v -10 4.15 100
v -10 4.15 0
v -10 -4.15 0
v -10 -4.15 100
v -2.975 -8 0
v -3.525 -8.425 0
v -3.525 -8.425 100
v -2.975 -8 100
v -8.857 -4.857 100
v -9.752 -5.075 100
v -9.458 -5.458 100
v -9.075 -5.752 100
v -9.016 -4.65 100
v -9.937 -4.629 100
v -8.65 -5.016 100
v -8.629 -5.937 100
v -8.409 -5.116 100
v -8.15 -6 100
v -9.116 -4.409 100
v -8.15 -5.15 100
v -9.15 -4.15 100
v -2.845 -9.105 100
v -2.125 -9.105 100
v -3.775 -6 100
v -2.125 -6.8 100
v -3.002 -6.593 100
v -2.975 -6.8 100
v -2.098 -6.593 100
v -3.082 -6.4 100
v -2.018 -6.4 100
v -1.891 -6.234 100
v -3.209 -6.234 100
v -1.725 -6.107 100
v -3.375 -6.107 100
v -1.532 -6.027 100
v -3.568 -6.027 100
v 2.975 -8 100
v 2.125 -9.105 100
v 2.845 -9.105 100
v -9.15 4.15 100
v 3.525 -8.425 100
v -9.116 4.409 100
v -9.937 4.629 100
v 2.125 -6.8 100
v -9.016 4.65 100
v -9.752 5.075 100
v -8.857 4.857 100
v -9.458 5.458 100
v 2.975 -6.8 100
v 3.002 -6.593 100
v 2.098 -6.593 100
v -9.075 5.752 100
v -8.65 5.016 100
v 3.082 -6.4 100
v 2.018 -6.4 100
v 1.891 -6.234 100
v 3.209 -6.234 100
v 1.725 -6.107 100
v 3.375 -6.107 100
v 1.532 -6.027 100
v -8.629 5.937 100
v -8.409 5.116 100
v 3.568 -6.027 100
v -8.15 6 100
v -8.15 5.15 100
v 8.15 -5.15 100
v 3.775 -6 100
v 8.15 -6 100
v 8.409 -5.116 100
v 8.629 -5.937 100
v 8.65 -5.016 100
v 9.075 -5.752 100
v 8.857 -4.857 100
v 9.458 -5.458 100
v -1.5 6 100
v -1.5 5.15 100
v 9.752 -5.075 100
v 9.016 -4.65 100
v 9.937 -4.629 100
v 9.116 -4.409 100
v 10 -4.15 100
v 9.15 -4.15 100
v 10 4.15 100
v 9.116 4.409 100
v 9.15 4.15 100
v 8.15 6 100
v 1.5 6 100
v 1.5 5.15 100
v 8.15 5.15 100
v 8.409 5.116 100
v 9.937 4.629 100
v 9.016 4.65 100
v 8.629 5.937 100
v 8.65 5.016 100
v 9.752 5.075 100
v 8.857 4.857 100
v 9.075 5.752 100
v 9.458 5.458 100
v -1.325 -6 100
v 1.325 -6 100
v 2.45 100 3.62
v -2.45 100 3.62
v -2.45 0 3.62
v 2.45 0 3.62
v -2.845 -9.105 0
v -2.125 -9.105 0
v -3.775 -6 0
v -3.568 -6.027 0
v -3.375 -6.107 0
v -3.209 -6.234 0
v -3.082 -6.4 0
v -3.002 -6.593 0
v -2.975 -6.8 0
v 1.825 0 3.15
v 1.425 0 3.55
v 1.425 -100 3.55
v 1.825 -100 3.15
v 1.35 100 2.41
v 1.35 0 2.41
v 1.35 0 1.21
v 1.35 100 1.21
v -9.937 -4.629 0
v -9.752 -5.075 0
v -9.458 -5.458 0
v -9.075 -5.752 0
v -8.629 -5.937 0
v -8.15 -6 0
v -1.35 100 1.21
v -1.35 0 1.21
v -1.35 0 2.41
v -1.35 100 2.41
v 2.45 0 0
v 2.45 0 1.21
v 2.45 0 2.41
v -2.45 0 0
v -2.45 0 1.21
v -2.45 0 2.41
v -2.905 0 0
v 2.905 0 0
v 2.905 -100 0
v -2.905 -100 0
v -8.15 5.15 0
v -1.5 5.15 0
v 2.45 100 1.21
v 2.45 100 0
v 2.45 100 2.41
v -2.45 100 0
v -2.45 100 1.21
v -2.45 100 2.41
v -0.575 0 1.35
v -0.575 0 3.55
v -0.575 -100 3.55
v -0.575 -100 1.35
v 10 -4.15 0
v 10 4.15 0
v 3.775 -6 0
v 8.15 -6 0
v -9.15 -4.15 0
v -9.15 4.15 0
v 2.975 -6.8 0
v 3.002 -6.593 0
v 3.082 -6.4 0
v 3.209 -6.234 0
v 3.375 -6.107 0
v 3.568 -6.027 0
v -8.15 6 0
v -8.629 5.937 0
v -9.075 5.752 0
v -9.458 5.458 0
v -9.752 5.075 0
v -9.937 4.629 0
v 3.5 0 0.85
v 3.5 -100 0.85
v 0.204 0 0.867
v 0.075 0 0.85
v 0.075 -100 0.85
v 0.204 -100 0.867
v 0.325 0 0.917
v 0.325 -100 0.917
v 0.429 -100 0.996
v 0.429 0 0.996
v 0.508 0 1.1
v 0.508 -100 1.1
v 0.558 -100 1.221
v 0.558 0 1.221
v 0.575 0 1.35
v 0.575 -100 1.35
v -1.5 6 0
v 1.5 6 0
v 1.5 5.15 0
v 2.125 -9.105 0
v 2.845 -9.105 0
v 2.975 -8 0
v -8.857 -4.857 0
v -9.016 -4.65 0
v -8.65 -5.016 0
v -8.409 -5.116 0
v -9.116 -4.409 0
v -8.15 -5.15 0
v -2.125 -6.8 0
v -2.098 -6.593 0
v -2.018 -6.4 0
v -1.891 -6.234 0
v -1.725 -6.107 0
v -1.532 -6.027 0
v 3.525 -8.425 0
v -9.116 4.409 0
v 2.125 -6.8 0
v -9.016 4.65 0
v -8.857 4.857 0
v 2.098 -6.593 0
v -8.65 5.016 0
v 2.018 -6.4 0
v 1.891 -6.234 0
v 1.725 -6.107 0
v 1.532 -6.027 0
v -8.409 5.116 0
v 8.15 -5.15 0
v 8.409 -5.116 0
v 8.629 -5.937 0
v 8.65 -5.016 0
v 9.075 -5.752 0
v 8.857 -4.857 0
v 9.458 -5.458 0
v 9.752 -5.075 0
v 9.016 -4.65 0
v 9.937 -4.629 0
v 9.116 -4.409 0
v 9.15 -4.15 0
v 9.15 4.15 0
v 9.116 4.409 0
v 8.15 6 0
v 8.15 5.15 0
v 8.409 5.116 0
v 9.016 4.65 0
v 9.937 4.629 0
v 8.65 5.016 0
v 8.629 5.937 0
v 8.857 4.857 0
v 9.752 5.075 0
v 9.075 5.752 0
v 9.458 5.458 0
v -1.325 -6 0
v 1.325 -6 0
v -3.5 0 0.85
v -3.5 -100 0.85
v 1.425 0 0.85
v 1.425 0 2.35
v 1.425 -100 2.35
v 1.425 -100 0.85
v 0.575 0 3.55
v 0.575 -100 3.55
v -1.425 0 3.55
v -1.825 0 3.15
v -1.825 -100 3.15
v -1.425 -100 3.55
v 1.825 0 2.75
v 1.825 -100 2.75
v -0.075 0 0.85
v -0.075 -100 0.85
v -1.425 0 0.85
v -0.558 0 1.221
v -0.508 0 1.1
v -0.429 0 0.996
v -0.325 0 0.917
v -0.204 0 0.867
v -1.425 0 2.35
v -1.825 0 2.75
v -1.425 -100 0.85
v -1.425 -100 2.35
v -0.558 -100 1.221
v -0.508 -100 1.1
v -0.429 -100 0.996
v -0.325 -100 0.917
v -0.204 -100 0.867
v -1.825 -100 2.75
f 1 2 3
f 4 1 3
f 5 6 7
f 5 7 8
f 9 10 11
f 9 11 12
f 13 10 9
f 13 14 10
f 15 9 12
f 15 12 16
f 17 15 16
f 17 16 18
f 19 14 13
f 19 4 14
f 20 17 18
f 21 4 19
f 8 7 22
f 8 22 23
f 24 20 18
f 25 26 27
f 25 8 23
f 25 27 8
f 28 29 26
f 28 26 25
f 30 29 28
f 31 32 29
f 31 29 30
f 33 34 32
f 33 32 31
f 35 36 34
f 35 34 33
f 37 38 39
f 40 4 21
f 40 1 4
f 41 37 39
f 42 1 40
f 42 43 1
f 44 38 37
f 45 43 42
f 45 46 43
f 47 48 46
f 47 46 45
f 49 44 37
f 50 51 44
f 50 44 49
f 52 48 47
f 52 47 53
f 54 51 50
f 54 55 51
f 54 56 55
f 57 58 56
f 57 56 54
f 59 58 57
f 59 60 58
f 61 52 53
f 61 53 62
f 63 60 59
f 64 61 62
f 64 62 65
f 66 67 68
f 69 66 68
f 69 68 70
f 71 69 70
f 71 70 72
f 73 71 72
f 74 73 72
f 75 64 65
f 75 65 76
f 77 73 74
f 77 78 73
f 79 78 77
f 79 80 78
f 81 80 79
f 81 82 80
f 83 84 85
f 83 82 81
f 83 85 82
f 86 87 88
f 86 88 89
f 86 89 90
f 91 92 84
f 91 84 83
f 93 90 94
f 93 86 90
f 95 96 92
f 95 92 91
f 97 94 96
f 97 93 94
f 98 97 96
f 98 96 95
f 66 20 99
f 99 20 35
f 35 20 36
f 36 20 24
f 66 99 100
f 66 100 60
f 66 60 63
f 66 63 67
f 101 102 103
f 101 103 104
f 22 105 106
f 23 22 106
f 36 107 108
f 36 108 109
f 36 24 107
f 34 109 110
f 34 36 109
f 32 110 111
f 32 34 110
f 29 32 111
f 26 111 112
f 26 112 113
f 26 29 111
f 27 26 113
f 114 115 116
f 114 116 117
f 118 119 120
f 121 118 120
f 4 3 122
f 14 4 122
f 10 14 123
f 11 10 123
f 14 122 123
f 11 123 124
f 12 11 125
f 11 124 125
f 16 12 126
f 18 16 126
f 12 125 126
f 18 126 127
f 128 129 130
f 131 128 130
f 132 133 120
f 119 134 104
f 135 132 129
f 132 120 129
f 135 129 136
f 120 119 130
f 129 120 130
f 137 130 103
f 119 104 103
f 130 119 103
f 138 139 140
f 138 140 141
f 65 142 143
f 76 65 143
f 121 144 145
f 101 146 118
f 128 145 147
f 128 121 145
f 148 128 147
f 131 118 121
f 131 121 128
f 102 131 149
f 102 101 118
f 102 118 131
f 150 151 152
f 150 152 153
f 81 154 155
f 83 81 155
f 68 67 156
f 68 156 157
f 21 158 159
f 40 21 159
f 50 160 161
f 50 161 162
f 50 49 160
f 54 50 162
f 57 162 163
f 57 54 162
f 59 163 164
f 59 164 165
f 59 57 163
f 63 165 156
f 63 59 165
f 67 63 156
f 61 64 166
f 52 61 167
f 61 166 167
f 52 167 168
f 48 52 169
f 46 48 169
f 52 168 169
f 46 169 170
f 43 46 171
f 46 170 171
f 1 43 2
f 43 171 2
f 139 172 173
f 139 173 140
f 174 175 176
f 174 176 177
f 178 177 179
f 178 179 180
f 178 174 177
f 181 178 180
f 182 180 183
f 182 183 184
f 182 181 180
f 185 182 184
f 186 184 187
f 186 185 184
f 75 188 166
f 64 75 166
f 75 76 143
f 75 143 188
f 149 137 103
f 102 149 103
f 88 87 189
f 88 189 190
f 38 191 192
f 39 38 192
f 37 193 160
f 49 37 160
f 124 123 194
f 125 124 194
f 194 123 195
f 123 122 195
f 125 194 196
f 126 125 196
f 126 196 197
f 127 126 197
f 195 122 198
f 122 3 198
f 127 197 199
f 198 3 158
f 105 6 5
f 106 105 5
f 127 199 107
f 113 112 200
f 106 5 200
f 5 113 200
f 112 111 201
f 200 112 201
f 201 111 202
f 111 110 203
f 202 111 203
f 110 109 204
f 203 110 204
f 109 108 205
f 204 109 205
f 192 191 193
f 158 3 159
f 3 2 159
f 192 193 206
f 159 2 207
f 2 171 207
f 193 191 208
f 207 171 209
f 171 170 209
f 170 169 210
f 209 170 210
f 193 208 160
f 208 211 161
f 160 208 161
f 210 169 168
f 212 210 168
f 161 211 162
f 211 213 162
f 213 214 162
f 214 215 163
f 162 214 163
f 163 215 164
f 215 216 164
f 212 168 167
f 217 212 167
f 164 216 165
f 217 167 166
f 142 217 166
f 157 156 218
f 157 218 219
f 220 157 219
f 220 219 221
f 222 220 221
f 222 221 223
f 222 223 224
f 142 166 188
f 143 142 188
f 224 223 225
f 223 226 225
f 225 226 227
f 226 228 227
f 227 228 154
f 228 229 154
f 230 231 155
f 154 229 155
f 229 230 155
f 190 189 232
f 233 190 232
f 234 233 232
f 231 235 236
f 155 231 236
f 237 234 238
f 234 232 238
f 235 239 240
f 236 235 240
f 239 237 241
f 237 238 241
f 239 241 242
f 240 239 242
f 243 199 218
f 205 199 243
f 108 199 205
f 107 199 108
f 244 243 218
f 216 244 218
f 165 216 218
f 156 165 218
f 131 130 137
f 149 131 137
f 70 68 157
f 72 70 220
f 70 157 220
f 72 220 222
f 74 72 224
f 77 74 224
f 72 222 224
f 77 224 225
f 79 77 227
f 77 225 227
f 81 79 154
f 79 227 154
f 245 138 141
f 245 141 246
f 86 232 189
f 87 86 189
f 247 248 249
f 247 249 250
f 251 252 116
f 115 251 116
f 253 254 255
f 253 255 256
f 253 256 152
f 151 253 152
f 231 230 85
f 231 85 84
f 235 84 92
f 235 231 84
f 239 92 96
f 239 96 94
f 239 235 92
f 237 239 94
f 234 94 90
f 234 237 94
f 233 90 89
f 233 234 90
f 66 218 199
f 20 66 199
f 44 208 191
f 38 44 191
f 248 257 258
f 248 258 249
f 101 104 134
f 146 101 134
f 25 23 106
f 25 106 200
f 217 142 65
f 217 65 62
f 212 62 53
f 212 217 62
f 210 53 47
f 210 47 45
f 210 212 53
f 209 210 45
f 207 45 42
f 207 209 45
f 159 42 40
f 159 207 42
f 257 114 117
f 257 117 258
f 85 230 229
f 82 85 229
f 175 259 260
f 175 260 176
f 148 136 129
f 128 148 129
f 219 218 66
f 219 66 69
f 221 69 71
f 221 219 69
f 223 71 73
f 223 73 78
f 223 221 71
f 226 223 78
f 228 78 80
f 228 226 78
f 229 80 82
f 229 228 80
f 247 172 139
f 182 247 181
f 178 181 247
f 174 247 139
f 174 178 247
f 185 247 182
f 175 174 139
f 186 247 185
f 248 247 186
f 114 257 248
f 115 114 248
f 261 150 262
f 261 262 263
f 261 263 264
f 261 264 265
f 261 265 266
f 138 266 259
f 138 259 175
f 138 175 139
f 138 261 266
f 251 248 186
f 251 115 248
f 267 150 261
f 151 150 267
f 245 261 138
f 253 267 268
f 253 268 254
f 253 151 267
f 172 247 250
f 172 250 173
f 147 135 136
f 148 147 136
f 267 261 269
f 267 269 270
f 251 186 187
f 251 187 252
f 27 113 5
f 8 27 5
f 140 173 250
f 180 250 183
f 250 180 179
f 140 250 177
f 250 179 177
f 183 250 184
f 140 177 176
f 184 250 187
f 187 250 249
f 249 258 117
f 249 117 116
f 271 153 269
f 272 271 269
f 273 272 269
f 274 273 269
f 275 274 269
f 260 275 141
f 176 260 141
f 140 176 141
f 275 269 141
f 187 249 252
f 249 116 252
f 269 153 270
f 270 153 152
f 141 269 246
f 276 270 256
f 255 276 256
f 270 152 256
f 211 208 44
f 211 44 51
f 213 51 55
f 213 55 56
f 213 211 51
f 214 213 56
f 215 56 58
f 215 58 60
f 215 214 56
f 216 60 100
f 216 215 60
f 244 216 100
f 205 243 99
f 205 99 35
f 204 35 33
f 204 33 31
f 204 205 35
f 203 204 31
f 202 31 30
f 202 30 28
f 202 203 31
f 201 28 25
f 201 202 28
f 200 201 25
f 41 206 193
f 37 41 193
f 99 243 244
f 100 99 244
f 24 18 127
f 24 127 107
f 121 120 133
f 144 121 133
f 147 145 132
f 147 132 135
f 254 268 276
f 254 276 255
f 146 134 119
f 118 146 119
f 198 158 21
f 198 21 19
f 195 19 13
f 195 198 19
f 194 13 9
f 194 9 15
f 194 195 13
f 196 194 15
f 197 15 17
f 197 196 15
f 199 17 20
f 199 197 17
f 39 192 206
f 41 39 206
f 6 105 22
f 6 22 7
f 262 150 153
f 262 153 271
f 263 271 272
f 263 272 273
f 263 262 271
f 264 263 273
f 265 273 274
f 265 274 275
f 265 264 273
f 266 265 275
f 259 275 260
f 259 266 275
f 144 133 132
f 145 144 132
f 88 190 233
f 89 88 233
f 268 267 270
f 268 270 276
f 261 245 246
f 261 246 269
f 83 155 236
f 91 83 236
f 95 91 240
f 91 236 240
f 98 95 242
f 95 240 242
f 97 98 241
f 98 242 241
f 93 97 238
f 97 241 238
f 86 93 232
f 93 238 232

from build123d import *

# Parameters (mm, degrees)
PAD002_DEPTH = 100
PAD003_DEPTH = 100
PAD_DEPTH    = 100
FILLET_R     = 0.8


with BuildPart() as capbody:
    # Sketch002 → Pad002 (new body)
    with BuildSketch(Plane(origin=(0, 0, 0), x_dir=(-1, 0, 0), z_dir=(0, 1, 0))):
        Polygon((-2.45, 0), (2.45, 0), (2.45, 1.21), (1.35, 1.21), (1.35, 2.41), (2.45, 2.41), (2.45, 3.62), (-2.45, 3.62), (-2.45, 2.41), (-1.35, 2.41), (-1.35, 1.21), (-2.45, 1.21), align=None)
    extrude(amount=PAD002_DEPTH)


with BuildPart() as cap2body:
    # Sketch003 → Pad003 (new body)
    with BuildSketch(Plane.XZ):
        with BuildLine():
            Line((-0.575, 3.55), (-0.575, 1.35))
            ThreePointArc((-0.575, 1.35), (-0.428553, 0.996447), (-0.075, 0.85))
            Line((-0.075, 0.85), (0.075, 0.85))
            ThreePointArc((0.075, 0.85), (0.428553, 0.996447), (0.575, 1.35))
            Line((0.575, 1.35), (0.575, 3.55))
            Line((0.575, 3.55), (1.425, 3.55))
            Line((1.425, 3.55), (1.825, 3.15))
            Line((1.825, 3.15), (1.825, 2.75))
            Line((1.825, 2.75), (1.425, 2.35))
            Line((1.425, 2.35), (1.425, 0.85))
            Line((1.425, 0.85), (3.5, 0.85))
            Line((3.5, 0.85), (2.904824, 0))
            Line((2.904824, 0), (-2.904824, 0))
            Line((-2.904824, 0), (-3.5, 0.85))
            Line((-3.5, 0.85), (-1.425, 0.85))
            Line((-1.425, 0.85), (-1.425, 2.35))
            Line((-1.425, 2.35), (-1.825, 2.75))
            Line((-1.825, 2.75), (-1.825, 3.15))
            Line((-1.825, 3.15), (-1.425, 3.55))
            Line((-1.425, 3.55), (-0.575, 3.55))
        make_face()
    extrude(amount=PAD003_DEPTH)


with BuildPart() as guidebody:
    # Sketch004 → Pad (new body)
    with BuildSketch(Plane.XY):
        with BuildLine():
            Line((-10, 4.15), (-10, -4.15))
            ThreePointArc((-10, -4.15), (-9.458148, -5.458147), (-8.15, -6))
            Line((-8.15, -6), (-2.975, -6))
            Line((-2.975, -6), (-2.975, -8))
            Line((-3.525, -8.425), (-2.975, -8))
            Line((-2.845, -9.105), (-3.525, -8.425))
            Line((-2.845, -9.105), (-2.125, -9.105))
            Line((-2.125, -9.105), (-2.125, -6.8))
            ThreePointArc((-1.325, -6), (-1.890685, -6.234315), (-2.125, -6.8))
            Line((-1.325, -6), (1.325, -6))
            ThreePointArc((2.125, -6.8), (1.890685, -6.234315), (1.325, -6))
            Line((2.125, -6.8), (2.125, -9.105))
            Line((2.125, -9.105), (2.845, -9.105))
            Line((2.845, -9.105), (3.525, -8.425))
            Line((3.525, -8.425), (2.975, -8))
            Line((2.975, -8), (2.975, -6))
            Line((2.975, -6), (8.15, -6))
            ThreePointArc((8.15, -6), (9.458148, -5.458148), (10, -4.15))
            Line((10, -4.15), (10, 4.15))
            ThreePointArc((10, 4.15), (9.458147, 5.458148), (8.15, 6))
            Line((8.15, 6), (1.5, 6))
            Line((1.5, 6), (1.5, 5.15))
            Line((1.5, 5.15), (8.15, 5.15))
            ThreePointArc((9.15, 4.15), (8.857107, 4.857107), (8.15, 5.15))
            Line((9.15, 4.15), (9.15, -4.15))
            ThreePointArc((8.15, -5.15), (8.857107, -4.857107), (9.15, -4.15))
            Line((8.15, -5.15), (-8.15, -5.15))
            ThreePointArc((-9.15, -4.15), (-8.857107, -4.857107), (-8.15, -5.15))
            Line((-9.15, -4.15), (-9.15, 4.15))
            ThreePointArc((-8.15, 5.15), (-8.857107, 4.857107), (-9.15, 4.15))
            Line((-8.15, 5.15), (-1.5, 5.15))
            Line((-1.5, 5.15), (-1.5, 6))
            Line((-1.5, 6), (-8.15, 6))
            ThreePointArc((-8.15, 6), (-9.458148, 5.458148), (-10, 4.15))
        make_face()
    extrude(amount=PAD_DEPTH)

    # Fillet
    fillet_edges = [guidebody.edges().sort_by_distance(p)[0] for p in [
        (-2.975, -6, 50),
        (2.975, -6, 50),
    ]]
    fillet(fillet_edges, radius=FILLET_R)


solid = Compound([capbody.part, cap2body.part, guidebody.part])
